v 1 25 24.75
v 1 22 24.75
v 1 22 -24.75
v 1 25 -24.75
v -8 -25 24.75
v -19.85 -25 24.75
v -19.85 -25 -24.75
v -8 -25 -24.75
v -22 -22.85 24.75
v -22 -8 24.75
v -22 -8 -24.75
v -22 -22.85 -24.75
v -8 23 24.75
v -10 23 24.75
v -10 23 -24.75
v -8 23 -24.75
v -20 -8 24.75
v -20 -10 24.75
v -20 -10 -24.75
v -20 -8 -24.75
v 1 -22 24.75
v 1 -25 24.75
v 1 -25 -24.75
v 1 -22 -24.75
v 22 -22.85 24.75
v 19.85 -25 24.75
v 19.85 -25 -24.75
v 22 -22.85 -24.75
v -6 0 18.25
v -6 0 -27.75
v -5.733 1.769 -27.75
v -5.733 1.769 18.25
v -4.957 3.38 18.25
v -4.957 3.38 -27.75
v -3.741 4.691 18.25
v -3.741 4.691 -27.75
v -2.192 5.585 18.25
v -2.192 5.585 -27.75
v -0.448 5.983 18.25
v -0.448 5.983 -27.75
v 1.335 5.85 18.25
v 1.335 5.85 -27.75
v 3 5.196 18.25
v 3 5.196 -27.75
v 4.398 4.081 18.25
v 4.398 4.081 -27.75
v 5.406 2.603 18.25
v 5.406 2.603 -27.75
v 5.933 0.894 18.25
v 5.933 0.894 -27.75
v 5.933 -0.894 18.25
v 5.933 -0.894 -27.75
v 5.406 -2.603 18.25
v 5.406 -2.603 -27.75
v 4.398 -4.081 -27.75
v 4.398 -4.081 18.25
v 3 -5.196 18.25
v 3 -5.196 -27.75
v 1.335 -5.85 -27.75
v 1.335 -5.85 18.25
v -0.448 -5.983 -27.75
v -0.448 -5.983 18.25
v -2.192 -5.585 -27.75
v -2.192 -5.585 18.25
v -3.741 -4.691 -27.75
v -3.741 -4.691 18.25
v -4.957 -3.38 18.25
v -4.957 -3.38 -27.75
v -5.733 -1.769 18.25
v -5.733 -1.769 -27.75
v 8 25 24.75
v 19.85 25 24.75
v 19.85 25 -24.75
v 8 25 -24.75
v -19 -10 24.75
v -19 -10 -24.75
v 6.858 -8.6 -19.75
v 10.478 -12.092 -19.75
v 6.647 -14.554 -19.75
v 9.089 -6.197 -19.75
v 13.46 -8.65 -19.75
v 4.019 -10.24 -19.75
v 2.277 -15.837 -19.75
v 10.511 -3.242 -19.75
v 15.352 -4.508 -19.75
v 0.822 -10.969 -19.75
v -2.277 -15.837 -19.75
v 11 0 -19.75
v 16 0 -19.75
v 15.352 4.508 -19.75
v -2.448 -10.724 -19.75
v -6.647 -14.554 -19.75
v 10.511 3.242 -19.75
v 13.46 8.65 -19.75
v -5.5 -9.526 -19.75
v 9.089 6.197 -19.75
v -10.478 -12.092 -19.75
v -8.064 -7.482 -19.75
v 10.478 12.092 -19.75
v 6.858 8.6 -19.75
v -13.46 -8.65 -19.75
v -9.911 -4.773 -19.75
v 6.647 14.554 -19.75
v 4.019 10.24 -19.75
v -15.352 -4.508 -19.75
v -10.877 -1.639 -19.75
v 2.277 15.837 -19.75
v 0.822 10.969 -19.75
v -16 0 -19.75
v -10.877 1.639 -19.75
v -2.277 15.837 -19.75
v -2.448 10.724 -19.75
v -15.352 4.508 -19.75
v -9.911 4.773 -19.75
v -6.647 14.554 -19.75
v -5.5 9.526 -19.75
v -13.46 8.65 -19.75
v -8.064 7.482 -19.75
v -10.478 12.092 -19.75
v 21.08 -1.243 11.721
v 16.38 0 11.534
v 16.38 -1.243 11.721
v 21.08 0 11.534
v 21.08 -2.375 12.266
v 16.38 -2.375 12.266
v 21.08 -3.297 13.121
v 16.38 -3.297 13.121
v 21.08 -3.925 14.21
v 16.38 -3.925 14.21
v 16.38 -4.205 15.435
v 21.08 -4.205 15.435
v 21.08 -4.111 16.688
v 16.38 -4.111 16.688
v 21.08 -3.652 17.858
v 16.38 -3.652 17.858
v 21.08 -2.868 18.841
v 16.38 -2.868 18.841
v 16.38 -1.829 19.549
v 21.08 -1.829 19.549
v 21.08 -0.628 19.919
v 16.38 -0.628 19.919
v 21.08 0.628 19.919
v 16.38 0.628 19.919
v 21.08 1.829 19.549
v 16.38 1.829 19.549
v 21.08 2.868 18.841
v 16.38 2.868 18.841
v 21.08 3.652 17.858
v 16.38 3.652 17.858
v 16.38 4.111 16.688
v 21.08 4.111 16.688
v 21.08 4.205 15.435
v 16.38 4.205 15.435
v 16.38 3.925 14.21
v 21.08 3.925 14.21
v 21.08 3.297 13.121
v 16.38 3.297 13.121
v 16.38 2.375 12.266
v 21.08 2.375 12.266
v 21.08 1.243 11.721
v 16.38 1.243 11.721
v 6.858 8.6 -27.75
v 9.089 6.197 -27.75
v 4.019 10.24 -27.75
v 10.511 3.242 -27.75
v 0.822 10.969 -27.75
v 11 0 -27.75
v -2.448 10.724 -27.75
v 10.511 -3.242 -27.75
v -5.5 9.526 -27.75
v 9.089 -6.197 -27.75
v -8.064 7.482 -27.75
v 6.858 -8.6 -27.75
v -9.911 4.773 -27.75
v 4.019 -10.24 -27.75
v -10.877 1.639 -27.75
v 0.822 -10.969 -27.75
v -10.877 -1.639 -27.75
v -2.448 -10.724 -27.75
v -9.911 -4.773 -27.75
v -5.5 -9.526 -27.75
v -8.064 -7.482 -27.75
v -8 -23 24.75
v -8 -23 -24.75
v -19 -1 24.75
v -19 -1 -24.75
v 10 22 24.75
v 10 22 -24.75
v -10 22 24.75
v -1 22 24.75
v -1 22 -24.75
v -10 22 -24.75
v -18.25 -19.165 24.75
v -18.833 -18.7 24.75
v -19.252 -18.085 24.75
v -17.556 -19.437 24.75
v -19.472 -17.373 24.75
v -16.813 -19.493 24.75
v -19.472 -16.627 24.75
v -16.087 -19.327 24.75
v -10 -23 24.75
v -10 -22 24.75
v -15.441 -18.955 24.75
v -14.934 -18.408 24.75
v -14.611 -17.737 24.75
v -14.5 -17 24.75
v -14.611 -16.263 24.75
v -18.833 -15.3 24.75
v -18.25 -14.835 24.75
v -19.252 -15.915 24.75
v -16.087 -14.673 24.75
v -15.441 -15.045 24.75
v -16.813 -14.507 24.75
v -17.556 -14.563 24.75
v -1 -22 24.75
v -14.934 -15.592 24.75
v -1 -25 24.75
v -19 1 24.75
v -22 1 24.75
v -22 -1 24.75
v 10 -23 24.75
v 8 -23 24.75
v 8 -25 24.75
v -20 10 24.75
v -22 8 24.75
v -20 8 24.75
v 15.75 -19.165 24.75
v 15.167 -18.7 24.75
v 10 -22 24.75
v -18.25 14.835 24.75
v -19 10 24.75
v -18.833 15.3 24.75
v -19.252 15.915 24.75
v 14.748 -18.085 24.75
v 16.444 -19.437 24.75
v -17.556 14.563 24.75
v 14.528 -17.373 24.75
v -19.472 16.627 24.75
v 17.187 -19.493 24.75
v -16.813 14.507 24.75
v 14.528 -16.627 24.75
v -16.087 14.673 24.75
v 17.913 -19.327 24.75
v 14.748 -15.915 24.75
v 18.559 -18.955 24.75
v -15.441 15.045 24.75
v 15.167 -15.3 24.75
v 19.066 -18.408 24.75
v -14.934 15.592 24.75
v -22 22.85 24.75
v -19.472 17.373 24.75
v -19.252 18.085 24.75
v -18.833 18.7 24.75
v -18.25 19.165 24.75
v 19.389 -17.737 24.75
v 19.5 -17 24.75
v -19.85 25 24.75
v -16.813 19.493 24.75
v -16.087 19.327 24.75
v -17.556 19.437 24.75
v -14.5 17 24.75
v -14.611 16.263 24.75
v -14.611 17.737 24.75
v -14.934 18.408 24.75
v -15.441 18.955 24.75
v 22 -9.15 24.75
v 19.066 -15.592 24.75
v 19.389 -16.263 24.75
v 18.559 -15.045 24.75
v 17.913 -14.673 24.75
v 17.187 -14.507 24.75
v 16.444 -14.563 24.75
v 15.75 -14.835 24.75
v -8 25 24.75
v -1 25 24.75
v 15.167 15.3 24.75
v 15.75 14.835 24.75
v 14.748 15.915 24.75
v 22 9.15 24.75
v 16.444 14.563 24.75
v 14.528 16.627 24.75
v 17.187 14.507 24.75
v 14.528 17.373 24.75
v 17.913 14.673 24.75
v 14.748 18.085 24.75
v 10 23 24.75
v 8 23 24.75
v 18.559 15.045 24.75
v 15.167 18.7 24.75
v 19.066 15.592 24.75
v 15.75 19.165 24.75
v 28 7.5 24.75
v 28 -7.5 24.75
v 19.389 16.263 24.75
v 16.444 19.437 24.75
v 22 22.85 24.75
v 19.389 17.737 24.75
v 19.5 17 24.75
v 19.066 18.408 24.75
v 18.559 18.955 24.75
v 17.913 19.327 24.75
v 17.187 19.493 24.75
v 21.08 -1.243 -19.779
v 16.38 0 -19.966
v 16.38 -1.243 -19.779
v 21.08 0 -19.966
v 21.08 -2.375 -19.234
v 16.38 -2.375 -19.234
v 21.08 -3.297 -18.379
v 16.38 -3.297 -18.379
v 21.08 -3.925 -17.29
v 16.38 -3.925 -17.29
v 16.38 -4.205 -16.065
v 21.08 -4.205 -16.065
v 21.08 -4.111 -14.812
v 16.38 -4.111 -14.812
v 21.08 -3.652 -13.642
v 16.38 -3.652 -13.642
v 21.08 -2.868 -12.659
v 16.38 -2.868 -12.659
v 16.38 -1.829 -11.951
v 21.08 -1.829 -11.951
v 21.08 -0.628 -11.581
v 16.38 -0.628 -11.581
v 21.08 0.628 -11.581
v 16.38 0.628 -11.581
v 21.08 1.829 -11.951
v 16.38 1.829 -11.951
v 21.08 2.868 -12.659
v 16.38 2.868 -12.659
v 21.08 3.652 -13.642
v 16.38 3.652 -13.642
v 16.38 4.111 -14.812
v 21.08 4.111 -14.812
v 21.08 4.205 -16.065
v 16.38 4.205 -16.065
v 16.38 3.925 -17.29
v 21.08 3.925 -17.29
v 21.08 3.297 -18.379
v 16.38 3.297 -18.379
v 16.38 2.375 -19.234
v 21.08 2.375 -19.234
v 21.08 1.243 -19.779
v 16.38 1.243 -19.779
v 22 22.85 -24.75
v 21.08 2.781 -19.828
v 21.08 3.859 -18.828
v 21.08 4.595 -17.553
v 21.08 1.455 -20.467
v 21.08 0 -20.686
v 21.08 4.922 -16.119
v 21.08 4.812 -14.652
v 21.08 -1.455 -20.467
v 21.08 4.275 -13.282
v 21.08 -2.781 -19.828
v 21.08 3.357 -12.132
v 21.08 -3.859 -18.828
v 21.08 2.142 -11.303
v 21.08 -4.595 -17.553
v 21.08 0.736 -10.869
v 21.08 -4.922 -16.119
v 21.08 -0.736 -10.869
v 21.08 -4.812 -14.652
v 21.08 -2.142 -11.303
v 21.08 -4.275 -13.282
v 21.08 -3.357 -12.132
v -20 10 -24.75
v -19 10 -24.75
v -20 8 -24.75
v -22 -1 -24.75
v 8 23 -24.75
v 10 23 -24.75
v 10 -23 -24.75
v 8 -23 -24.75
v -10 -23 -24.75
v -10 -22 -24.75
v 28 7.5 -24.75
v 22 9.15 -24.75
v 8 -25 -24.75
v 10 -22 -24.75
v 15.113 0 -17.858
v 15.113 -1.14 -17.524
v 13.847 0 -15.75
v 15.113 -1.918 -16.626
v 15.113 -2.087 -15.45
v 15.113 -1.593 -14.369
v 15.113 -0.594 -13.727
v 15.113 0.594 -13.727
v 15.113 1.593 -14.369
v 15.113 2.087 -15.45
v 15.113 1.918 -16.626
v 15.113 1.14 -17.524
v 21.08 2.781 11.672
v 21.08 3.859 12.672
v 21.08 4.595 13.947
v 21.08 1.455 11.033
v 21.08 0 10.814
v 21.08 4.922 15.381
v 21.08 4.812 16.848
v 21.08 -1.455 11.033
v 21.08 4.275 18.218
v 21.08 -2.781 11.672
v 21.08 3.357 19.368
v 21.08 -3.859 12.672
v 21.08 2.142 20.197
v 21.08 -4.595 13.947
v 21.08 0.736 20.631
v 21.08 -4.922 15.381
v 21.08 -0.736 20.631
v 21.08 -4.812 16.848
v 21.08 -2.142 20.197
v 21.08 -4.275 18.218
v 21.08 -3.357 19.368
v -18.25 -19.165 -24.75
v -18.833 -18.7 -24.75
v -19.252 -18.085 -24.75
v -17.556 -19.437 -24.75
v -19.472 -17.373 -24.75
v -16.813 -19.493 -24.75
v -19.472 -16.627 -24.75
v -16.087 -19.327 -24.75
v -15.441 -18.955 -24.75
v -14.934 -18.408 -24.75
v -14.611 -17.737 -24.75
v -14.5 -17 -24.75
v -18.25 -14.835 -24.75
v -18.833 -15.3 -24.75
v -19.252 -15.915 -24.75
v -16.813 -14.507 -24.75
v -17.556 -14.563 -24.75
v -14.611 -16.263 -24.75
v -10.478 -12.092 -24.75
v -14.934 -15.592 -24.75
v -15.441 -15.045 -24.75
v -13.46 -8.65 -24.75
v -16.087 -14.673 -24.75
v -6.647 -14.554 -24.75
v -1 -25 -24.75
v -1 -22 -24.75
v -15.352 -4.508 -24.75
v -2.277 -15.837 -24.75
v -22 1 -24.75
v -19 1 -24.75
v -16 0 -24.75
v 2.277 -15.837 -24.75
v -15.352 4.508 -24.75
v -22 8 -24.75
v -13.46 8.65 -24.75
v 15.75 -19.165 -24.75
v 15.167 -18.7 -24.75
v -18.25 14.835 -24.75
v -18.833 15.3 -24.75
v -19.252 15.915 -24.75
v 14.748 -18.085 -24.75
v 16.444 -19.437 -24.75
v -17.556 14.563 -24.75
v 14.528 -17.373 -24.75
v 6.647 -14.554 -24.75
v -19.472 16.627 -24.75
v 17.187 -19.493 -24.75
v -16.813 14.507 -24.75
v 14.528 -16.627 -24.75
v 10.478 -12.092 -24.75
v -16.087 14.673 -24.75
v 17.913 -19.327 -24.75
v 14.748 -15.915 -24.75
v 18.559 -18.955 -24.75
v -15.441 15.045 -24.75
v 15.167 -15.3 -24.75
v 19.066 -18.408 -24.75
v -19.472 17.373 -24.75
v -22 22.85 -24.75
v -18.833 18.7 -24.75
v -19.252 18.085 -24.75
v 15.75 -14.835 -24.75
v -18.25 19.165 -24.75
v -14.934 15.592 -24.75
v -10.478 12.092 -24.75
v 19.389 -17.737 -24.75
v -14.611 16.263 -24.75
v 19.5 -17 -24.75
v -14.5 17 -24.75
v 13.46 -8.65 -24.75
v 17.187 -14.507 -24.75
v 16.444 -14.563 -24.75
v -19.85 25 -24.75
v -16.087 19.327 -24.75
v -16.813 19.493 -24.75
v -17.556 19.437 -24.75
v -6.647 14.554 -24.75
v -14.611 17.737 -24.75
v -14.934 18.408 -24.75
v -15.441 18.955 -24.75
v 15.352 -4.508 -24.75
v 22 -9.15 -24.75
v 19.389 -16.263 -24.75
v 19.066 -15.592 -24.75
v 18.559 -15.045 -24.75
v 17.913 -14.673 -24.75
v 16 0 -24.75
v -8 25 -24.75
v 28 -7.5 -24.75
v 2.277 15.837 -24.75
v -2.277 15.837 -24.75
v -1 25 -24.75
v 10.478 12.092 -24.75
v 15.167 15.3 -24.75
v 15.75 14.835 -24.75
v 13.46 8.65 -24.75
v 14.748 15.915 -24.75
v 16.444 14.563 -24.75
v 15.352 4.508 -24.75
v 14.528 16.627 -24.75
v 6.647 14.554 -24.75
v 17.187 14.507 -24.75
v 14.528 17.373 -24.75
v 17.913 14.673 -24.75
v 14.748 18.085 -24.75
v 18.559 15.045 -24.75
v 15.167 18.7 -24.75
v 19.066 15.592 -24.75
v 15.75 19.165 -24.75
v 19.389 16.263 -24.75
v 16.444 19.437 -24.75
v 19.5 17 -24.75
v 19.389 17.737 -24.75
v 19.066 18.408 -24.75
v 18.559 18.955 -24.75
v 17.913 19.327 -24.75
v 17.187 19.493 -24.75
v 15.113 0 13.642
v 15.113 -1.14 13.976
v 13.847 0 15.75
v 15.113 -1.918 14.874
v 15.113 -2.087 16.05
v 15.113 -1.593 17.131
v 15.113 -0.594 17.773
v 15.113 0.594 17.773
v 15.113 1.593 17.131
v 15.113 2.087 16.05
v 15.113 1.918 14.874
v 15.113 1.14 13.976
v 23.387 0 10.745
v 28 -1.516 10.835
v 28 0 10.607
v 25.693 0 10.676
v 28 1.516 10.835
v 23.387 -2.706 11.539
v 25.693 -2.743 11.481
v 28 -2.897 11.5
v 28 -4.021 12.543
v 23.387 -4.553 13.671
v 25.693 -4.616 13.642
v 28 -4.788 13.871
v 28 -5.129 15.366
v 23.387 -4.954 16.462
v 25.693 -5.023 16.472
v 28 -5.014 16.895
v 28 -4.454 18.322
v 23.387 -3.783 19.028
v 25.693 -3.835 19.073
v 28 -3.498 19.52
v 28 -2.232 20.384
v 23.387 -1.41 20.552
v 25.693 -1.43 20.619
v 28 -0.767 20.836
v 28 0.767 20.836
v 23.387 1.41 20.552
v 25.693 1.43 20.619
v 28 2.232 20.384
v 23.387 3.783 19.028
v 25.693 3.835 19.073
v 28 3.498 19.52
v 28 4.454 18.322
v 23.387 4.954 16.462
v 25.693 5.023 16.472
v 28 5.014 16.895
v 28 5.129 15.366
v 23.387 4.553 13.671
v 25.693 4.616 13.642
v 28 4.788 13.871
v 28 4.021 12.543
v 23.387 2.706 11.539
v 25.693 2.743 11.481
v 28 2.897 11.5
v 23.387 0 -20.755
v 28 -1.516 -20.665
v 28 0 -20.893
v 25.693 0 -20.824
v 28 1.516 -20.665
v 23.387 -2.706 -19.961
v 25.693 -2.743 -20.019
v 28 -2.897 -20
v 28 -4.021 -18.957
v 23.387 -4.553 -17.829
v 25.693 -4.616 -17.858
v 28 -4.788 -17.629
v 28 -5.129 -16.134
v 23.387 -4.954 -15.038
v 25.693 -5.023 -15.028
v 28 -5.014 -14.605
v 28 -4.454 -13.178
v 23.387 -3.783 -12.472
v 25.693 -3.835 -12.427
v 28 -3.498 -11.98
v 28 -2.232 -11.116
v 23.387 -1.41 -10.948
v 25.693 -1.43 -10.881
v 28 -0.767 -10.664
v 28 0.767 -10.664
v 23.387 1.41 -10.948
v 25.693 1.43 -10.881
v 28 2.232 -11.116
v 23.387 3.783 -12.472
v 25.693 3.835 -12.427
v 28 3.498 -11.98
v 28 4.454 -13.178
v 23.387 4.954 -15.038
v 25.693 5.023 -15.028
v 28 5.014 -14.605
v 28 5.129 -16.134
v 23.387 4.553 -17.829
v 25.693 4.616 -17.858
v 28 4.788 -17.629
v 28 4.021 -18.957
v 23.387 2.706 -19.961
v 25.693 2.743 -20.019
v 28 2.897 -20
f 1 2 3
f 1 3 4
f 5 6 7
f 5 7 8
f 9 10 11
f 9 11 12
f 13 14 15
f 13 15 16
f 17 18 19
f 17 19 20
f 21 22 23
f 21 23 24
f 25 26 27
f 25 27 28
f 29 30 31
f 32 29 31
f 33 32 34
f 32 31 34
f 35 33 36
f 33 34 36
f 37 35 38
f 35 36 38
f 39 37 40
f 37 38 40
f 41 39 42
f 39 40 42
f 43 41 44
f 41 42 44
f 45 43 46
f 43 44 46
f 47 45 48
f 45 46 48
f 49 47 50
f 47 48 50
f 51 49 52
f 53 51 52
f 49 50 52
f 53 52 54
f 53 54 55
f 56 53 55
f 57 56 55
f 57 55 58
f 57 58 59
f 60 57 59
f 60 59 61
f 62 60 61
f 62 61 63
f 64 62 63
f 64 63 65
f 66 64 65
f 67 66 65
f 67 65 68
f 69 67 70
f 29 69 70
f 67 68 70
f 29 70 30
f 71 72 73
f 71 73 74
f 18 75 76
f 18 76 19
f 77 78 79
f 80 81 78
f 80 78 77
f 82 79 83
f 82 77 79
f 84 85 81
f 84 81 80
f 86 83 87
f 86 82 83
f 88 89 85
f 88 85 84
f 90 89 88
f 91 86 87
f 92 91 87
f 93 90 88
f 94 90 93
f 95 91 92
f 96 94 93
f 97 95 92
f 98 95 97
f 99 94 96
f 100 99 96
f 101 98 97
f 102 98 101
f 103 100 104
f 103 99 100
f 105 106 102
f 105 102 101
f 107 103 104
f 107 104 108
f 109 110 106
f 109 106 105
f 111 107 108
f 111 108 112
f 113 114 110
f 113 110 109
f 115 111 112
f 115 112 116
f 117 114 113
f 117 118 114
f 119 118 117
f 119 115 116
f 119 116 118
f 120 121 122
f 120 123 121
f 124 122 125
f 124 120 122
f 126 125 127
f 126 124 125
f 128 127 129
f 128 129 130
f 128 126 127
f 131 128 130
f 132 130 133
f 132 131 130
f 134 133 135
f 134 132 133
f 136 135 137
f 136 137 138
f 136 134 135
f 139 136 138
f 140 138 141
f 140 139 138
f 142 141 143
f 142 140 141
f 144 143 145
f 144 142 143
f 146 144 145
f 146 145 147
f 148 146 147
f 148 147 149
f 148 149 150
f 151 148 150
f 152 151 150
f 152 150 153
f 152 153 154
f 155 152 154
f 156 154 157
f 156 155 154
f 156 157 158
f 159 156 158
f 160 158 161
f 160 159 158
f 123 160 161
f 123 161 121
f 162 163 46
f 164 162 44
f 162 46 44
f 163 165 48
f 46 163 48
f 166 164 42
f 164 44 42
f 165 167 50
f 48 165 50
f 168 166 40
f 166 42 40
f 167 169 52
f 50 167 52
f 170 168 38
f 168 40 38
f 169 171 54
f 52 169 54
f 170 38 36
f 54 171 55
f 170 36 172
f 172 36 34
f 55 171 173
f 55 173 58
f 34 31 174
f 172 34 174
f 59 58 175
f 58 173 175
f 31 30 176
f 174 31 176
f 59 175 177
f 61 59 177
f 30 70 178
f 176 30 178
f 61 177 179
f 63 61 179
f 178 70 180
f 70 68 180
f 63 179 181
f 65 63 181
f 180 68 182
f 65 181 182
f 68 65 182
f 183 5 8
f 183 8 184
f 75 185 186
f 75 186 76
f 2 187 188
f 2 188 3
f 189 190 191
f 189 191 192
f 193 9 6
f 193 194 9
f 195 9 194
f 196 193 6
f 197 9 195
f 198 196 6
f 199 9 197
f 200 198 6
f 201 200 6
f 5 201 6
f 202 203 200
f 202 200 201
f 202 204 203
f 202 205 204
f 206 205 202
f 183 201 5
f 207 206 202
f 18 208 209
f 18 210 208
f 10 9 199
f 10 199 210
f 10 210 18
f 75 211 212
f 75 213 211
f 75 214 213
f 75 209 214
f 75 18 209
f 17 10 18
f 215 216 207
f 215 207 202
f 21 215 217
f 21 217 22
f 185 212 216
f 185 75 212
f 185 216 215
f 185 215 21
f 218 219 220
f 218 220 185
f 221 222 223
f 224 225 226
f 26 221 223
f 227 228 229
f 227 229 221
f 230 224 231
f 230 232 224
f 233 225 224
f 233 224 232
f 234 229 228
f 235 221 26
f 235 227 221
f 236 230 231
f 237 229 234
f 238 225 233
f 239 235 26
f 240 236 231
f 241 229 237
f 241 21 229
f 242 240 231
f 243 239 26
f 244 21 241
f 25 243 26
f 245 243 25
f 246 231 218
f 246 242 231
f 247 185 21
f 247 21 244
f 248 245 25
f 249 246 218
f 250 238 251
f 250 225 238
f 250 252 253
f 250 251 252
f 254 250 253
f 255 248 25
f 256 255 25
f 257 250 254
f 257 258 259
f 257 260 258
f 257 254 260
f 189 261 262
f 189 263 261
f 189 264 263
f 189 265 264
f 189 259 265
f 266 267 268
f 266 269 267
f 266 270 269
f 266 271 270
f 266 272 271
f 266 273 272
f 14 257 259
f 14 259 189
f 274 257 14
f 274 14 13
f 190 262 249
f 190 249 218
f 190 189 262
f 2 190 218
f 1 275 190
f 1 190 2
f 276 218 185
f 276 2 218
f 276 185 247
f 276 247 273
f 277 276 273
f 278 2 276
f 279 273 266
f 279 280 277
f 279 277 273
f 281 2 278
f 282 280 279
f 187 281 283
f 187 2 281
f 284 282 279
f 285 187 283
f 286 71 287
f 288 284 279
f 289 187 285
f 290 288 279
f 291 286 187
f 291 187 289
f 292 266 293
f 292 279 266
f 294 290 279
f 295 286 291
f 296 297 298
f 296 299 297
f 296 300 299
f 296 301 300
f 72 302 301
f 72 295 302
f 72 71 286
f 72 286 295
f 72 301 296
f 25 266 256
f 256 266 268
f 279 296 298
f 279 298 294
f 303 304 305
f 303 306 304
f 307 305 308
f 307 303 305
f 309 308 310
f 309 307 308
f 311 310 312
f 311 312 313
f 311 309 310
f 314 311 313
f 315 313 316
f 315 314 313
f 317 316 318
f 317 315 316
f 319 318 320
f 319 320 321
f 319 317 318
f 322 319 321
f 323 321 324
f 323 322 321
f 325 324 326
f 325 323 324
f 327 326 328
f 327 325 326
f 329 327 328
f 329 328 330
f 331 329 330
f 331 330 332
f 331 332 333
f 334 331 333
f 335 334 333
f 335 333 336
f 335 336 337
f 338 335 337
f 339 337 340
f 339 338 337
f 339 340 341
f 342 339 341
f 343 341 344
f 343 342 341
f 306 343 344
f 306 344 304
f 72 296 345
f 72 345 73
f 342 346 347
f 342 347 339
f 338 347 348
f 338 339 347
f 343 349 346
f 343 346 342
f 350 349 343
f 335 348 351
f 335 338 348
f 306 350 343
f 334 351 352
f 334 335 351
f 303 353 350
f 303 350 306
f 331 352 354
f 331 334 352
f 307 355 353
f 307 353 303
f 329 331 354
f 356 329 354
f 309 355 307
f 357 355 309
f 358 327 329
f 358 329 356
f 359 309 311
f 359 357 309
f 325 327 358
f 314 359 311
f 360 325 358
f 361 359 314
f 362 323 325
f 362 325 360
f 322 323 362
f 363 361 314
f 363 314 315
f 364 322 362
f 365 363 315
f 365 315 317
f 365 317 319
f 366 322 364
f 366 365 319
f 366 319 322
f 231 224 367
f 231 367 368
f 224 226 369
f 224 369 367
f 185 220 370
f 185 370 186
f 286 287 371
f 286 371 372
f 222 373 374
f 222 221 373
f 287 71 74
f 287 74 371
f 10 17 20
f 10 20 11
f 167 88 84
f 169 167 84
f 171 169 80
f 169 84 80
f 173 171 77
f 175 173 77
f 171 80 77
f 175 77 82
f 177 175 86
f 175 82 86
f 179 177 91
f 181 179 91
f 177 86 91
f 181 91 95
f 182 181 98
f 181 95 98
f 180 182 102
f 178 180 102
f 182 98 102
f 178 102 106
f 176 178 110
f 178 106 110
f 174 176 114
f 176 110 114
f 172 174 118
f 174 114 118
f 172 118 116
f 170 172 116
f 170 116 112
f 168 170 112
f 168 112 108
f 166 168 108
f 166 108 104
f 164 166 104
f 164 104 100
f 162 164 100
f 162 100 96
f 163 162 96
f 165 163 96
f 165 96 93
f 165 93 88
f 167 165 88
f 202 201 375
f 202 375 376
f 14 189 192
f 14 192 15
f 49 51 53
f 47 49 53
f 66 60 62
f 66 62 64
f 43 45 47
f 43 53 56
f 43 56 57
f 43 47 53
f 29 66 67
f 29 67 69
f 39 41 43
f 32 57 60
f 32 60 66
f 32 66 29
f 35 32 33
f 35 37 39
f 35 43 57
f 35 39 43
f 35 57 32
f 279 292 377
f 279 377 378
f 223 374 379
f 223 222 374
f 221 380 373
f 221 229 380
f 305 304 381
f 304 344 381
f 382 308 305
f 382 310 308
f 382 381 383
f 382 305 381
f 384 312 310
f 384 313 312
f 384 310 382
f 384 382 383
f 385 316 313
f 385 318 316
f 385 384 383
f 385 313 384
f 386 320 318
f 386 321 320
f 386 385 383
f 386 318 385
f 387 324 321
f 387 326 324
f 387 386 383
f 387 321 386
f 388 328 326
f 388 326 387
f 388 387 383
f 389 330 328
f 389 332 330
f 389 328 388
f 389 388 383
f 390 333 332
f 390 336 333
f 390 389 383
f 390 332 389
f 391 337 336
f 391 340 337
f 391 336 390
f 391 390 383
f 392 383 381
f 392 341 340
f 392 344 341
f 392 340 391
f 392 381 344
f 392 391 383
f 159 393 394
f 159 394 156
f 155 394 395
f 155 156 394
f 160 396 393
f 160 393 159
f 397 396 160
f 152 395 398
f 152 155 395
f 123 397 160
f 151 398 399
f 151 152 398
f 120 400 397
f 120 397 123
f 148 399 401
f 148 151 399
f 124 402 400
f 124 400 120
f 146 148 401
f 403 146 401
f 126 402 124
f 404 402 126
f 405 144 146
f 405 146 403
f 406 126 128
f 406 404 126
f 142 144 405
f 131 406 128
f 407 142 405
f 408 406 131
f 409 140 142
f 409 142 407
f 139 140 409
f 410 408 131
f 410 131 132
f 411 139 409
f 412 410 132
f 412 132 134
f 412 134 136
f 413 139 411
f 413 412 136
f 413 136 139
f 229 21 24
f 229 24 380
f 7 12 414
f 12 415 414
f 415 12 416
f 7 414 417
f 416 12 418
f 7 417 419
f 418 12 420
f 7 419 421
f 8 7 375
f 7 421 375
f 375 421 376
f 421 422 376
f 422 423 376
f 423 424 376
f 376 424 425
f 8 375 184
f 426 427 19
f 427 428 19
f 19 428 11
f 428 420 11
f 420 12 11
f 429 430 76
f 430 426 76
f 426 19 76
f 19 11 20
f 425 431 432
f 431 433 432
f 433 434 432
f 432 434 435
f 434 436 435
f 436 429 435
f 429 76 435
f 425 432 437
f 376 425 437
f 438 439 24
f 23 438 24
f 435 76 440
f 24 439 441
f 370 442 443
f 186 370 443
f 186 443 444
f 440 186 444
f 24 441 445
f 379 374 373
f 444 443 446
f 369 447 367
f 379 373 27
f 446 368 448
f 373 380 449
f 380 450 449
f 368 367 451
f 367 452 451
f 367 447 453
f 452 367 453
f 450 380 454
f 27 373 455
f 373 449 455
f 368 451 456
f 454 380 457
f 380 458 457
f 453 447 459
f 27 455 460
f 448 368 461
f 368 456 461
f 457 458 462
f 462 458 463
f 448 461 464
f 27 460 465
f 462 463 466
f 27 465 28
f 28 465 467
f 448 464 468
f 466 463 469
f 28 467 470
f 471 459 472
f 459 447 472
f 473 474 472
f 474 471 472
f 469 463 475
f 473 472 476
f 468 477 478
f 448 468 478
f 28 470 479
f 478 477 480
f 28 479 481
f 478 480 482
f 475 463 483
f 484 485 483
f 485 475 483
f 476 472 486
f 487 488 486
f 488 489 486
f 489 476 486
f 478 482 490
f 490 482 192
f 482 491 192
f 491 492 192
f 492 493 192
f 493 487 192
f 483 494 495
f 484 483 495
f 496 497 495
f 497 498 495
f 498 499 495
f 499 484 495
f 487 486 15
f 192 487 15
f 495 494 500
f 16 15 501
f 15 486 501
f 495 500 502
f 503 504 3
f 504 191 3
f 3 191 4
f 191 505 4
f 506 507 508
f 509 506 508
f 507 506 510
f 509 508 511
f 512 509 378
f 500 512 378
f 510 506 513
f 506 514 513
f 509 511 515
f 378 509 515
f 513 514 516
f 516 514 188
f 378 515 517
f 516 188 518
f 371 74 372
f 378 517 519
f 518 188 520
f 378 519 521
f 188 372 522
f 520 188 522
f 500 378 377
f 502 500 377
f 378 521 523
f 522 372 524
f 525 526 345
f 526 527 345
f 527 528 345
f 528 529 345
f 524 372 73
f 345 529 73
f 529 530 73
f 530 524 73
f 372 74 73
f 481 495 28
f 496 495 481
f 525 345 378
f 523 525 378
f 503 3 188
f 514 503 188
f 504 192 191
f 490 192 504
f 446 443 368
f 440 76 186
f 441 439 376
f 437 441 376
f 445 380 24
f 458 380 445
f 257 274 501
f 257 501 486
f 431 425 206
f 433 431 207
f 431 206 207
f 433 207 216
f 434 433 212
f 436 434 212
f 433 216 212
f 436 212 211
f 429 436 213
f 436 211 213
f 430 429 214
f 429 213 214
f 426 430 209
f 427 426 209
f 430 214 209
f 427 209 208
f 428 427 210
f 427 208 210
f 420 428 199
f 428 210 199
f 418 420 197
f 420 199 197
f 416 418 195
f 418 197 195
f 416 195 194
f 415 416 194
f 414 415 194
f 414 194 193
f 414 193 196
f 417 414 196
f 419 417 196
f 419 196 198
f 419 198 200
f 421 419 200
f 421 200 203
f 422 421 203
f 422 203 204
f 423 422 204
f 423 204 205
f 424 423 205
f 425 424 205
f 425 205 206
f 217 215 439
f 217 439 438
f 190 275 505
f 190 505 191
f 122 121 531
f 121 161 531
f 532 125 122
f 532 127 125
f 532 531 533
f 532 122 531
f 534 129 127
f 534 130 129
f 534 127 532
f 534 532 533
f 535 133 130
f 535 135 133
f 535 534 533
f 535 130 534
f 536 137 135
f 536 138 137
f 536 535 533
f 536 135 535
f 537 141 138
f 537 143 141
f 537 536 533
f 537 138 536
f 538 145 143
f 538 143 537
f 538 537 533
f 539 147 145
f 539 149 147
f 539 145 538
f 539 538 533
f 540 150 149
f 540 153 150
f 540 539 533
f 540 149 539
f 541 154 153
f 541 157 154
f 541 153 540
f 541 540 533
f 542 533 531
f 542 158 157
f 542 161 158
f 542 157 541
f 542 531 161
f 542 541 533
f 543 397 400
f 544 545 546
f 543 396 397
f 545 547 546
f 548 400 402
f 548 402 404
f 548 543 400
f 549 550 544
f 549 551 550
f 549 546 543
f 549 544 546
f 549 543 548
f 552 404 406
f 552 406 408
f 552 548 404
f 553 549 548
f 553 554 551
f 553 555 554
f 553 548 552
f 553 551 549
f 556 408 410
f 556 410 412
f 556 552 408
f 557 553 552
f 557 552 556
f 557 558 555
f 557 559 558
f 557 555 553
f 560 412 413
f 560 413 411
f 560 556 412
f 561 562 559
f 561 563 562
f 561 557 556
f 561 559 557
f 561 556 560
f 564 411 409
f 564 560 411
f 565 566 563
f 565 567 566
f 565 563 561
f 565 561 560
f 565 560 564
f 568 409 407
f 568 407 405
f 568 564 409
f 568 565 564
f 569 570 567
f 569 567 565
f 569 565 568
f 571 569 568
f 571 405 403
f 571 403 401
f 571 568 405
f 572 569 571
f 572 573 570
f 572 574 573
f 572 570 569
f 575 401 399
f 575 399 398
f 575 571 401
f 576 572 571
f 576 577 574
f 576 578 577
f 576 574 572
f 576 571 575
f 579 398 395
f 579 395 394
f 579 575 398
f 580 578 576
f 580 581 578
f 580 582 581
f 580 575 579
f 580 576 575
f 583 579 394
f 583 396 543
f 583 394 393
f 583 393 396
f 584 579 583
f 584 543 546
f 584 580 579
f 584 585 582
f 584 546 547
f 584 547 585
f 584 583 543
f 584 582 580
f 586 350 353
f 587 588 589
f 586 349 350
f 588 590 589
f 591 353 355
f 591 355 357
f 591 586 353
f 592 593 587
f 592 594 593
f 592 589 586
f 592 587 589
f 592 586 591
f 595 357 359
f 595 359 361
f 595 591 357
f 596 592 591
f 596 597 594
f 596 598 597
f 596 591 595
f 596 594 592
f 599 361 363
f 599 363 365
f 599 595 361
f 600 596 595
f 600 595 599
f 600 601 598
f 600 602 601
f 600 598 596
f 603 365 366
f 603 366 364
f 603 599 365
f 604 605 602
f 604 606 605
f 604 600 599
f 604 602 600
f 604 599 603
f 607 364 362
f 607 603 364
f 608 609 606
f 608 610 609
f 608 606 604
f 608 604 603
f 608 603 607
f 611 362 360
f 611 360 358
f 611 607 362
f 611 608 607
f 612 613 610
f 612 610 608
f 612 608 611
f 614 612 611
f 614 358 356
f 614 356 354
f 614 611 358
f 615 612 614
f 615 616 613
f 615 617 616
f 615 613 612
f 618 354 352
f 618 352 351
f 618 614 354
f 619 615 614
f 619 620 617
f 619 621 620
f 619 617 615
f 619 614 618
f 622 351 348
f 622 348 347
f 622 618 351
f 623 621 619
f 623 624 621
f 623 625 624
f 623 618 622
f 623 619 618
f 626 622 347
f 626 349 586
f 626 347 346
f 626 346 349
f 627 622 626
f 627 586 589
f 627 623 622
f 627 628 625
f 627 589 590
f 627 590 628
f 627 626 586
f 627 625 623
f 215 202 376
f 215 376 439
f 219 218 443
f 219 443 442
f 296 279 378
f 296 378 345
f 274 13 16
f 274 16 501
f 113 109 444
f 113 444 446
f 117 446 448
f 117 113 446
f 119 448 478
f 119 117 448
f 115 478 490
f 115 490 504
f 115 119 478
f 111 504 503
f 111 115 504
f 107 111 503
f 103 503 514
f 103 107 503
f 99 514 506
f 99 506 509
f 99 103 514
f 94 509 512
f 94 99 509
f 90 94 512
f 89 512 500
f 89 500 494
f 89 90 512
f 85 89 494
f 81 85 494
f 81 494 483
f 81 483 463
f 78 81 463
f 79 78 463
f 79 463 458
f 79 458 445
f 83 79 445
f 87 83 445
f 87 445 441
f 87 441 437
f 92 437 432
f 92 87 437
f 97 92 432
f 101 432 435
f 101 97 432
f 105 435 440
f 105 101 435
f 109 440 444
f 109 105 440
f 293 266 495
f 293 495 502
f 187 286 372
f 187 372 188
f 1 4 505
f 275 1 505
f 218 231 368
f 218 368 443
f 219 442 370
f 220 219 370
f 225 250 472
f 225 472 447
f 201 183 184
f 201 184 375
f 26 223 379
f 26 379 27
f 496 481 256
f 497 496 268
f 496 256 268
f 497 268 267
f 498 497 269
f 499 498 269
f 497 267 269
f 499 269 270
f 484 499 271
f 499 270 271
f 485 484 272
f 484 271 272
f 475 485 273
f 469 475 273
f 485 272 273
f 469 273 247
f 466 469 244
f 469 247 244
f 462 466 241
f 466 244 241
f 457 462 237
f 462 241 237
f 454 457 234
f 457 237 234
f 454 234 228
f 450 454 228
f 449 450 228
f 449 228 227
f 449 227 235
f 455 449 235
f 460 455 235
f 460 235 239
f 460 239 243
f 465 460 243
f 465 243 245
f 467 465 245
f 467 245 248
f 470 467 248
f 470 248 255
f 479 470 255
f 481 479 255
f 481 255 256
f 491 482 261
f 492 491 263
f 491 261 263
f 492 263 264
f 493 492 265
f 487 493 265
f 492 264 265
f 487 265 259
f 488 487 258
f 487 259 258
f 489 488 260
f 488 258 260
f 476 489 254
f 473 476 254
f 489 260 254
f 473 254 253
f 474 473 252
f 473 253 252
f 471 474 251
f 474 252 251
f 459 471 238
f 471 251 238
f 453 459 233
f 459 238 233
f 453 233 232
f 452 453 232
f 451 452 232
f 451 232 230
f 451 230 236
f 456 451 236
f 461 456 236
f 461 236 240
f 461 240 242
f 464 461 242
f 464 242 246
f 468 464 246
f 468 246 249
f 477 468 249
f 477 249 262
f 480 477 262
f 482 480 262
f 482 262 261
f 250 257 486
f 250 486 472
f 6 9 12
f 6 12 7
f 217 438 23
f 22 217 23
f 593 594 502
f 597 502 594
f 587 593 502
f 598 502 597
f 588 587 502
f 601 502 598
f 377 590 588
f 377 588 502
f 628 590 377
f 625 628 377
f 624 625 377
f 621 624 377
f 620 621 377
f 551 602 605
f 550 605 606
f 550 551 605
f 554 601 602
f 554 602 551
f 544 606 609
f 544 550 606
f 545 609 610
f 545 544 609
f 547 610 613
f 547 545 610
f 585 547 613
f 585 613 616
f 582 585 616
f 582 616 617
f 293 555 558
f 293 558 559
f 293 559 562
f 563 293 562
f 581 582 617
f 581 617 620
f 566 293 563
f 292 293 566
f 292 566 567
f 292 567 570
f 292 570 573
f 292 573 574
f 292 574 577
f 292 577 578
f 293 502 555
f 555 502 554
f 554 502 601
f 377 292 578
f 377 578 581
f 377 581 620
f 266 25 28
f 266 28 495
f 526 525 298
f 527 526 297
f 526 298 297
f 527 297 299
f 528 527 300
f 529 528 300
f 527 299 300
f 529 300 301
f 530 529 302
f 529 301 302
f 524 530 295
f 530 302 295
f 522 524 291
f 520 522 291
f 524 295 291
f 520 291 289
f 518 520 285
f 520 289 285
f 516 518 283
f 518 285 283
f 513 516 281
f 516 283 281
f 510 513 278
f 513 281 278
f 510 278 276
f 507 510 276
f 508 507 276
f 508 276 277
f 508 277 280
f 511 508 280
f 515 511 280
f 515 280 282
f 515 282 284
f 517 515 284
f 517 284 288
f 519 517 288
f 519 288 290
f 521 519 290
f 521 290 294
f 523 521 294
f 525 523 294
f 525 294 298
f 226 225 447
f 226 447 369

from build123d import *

# Parameters (mm, degrees)
SALIENTE_EXTRUIR1_DEPTH             = 24.75
CROQUIS2_W                          = 11
CROQUIS2_H                          = 3
CROQUIS3_R                          = 6
CORTAR_EXTRUIR1_DEPTH               = 46
CORTAR_EXTRUIR2_START               = -5
CROQUIS4_R                          = 16
CROQUIS4_R_2                        = 11
CORTAR_EXTRUIR2_DEPTH               = 5
TALADRO_ROSCADO_M61_D               = 5
TALADRO_ROSCADO_1_8_NPT1_AT_2_COUNT = 2
TALADRO_ROSCADO_1_8_NPT1_AT_2_PITCH = 31.5


with BuildPart() as part:
    # Croquis1 → Saliente-Extruir1 (new, symmetric)
    with BuildSketch(Plane.XY):
        Polygon((8, -23), (8, -25), (19.85, -25), (22, -22.85), (22, -9.15), (28, -7.5), (28, 7.5), (22, 9.15), (22, 22.85), (19.85, 25), (8, 25), (8, 23), (10, 23), (10, 22), (1, 22), (1, 25), (-1, 25), (-1, 22), (-10, 22), (-10, 23), (-8, 23), (-8, 25), (-19.85, 25), (-22, 22.85), (-22, 8), (-20, 8), (-20, 10), (-19, 10), (-19, 1), (-22, 1), (-22, -1), (-19, -1), (-19, -10), (-20, -10), (-20, -8), (-22, -8), (-22, -22.85), (-19.85, -25), (-8, -25), (-8, -23), (-10, -23), (-10, -22), (-1, -22), (-1, -25), (1, -25), (1, -22), (10, -22), (10, -23), align=None)
    extrude(amount=SALIENTE_EXTRUIR1_DEPTH, both=True)

    # Croquis2 → Revolución1 (revolve)
    with BuildSketch(Plane(origin=(0, 0, 0), x_dir=(1, 0, 0), z_dir=(0, 1, 0))):
        with Locations((5.5, 26.25)):
            Rectangle(CROQUIS2_W, CROQUIS2_H)
    revolve(axis=Axis((0, 0, -24.75), (0, 0, -1)))

    # Croquis3 → Cortar-Extruir1 (cut)
    with BuildSketch(Plane(origin=(0, 0, -27.75), x_dir=(-1, 0, 0), z_dir=(0, 0, -1))):
        Circle(CROQUIS3_R)
    extrude(amount=-CORTAR_EXTRUIR1_DEPTH, mode=Mode.SUBTRACT)

    # Croquis4 → Cortar-Extruir2 (cut)
    with BuildSketch(Plane(origin=(0, 0, -24.75), x_dir=(-1, 0, 0), z_dir=(0, 0, -1)).offset(CORTAR_EXTRUIR2_START)):
        Circle(CROQUIS4_R)
        with Locations(Location((0, 0, 0), (0, 0, 180))):
            Circle(CROQUIS4_R_2, mode=Mode.SUBTRACT)
    extrude(amount=CORTAR_EXTRUIR2_DEPTH, mode=Mode.SUBTRACT)

    # Taladro roscado M61 (through all)
    with Locations(Plane(origin=(0, 0, -24.75), x_dir=(-1, 0, 0), z_dir=(0, 0, -1))):
        with Locations((17, -17), (-17, -17), (-17, 17), (17, 17)):
            Hole(TALADRO_ROSCADO_M61_D / 2)

    # Croquis11 → Taladro roscado 1/8 NPT1 (revolve, cut)
    with BuildSketch(Plane(origin=(28, 0, -15.75), x_dir=(0, 0, -1), z_dir=(0, 1, 0))):
        Polygon((0, 0), (0, 14.153468714), (4.2164, 11.62), (4.2164, 6.92), (4.936178933, 6.92), (5.143373, 0), align=None)
    taladro_roscado_1_8_npt1 = revolve(axis=Axis((34.35, 0, -15.75), (-1, 0, 0)), mode=Mode.SUBTRACT)

    # Taladro roscado 1/8 NPT1 at 2: Taladro roscado 1/8 NPT1 ×2
    with Locations(*[(0, 0, i * TALADRO_ROSCADO_1_8_NPT1_AT_2_PITCH) for i in range(1, TALADRO_ROSCADO_1_8_NPT1_AT_2_COUNT)]):
        add(taladro_roscado_1_8_npt1, mode=Mode.SUBTRACT)


solid = part.part
